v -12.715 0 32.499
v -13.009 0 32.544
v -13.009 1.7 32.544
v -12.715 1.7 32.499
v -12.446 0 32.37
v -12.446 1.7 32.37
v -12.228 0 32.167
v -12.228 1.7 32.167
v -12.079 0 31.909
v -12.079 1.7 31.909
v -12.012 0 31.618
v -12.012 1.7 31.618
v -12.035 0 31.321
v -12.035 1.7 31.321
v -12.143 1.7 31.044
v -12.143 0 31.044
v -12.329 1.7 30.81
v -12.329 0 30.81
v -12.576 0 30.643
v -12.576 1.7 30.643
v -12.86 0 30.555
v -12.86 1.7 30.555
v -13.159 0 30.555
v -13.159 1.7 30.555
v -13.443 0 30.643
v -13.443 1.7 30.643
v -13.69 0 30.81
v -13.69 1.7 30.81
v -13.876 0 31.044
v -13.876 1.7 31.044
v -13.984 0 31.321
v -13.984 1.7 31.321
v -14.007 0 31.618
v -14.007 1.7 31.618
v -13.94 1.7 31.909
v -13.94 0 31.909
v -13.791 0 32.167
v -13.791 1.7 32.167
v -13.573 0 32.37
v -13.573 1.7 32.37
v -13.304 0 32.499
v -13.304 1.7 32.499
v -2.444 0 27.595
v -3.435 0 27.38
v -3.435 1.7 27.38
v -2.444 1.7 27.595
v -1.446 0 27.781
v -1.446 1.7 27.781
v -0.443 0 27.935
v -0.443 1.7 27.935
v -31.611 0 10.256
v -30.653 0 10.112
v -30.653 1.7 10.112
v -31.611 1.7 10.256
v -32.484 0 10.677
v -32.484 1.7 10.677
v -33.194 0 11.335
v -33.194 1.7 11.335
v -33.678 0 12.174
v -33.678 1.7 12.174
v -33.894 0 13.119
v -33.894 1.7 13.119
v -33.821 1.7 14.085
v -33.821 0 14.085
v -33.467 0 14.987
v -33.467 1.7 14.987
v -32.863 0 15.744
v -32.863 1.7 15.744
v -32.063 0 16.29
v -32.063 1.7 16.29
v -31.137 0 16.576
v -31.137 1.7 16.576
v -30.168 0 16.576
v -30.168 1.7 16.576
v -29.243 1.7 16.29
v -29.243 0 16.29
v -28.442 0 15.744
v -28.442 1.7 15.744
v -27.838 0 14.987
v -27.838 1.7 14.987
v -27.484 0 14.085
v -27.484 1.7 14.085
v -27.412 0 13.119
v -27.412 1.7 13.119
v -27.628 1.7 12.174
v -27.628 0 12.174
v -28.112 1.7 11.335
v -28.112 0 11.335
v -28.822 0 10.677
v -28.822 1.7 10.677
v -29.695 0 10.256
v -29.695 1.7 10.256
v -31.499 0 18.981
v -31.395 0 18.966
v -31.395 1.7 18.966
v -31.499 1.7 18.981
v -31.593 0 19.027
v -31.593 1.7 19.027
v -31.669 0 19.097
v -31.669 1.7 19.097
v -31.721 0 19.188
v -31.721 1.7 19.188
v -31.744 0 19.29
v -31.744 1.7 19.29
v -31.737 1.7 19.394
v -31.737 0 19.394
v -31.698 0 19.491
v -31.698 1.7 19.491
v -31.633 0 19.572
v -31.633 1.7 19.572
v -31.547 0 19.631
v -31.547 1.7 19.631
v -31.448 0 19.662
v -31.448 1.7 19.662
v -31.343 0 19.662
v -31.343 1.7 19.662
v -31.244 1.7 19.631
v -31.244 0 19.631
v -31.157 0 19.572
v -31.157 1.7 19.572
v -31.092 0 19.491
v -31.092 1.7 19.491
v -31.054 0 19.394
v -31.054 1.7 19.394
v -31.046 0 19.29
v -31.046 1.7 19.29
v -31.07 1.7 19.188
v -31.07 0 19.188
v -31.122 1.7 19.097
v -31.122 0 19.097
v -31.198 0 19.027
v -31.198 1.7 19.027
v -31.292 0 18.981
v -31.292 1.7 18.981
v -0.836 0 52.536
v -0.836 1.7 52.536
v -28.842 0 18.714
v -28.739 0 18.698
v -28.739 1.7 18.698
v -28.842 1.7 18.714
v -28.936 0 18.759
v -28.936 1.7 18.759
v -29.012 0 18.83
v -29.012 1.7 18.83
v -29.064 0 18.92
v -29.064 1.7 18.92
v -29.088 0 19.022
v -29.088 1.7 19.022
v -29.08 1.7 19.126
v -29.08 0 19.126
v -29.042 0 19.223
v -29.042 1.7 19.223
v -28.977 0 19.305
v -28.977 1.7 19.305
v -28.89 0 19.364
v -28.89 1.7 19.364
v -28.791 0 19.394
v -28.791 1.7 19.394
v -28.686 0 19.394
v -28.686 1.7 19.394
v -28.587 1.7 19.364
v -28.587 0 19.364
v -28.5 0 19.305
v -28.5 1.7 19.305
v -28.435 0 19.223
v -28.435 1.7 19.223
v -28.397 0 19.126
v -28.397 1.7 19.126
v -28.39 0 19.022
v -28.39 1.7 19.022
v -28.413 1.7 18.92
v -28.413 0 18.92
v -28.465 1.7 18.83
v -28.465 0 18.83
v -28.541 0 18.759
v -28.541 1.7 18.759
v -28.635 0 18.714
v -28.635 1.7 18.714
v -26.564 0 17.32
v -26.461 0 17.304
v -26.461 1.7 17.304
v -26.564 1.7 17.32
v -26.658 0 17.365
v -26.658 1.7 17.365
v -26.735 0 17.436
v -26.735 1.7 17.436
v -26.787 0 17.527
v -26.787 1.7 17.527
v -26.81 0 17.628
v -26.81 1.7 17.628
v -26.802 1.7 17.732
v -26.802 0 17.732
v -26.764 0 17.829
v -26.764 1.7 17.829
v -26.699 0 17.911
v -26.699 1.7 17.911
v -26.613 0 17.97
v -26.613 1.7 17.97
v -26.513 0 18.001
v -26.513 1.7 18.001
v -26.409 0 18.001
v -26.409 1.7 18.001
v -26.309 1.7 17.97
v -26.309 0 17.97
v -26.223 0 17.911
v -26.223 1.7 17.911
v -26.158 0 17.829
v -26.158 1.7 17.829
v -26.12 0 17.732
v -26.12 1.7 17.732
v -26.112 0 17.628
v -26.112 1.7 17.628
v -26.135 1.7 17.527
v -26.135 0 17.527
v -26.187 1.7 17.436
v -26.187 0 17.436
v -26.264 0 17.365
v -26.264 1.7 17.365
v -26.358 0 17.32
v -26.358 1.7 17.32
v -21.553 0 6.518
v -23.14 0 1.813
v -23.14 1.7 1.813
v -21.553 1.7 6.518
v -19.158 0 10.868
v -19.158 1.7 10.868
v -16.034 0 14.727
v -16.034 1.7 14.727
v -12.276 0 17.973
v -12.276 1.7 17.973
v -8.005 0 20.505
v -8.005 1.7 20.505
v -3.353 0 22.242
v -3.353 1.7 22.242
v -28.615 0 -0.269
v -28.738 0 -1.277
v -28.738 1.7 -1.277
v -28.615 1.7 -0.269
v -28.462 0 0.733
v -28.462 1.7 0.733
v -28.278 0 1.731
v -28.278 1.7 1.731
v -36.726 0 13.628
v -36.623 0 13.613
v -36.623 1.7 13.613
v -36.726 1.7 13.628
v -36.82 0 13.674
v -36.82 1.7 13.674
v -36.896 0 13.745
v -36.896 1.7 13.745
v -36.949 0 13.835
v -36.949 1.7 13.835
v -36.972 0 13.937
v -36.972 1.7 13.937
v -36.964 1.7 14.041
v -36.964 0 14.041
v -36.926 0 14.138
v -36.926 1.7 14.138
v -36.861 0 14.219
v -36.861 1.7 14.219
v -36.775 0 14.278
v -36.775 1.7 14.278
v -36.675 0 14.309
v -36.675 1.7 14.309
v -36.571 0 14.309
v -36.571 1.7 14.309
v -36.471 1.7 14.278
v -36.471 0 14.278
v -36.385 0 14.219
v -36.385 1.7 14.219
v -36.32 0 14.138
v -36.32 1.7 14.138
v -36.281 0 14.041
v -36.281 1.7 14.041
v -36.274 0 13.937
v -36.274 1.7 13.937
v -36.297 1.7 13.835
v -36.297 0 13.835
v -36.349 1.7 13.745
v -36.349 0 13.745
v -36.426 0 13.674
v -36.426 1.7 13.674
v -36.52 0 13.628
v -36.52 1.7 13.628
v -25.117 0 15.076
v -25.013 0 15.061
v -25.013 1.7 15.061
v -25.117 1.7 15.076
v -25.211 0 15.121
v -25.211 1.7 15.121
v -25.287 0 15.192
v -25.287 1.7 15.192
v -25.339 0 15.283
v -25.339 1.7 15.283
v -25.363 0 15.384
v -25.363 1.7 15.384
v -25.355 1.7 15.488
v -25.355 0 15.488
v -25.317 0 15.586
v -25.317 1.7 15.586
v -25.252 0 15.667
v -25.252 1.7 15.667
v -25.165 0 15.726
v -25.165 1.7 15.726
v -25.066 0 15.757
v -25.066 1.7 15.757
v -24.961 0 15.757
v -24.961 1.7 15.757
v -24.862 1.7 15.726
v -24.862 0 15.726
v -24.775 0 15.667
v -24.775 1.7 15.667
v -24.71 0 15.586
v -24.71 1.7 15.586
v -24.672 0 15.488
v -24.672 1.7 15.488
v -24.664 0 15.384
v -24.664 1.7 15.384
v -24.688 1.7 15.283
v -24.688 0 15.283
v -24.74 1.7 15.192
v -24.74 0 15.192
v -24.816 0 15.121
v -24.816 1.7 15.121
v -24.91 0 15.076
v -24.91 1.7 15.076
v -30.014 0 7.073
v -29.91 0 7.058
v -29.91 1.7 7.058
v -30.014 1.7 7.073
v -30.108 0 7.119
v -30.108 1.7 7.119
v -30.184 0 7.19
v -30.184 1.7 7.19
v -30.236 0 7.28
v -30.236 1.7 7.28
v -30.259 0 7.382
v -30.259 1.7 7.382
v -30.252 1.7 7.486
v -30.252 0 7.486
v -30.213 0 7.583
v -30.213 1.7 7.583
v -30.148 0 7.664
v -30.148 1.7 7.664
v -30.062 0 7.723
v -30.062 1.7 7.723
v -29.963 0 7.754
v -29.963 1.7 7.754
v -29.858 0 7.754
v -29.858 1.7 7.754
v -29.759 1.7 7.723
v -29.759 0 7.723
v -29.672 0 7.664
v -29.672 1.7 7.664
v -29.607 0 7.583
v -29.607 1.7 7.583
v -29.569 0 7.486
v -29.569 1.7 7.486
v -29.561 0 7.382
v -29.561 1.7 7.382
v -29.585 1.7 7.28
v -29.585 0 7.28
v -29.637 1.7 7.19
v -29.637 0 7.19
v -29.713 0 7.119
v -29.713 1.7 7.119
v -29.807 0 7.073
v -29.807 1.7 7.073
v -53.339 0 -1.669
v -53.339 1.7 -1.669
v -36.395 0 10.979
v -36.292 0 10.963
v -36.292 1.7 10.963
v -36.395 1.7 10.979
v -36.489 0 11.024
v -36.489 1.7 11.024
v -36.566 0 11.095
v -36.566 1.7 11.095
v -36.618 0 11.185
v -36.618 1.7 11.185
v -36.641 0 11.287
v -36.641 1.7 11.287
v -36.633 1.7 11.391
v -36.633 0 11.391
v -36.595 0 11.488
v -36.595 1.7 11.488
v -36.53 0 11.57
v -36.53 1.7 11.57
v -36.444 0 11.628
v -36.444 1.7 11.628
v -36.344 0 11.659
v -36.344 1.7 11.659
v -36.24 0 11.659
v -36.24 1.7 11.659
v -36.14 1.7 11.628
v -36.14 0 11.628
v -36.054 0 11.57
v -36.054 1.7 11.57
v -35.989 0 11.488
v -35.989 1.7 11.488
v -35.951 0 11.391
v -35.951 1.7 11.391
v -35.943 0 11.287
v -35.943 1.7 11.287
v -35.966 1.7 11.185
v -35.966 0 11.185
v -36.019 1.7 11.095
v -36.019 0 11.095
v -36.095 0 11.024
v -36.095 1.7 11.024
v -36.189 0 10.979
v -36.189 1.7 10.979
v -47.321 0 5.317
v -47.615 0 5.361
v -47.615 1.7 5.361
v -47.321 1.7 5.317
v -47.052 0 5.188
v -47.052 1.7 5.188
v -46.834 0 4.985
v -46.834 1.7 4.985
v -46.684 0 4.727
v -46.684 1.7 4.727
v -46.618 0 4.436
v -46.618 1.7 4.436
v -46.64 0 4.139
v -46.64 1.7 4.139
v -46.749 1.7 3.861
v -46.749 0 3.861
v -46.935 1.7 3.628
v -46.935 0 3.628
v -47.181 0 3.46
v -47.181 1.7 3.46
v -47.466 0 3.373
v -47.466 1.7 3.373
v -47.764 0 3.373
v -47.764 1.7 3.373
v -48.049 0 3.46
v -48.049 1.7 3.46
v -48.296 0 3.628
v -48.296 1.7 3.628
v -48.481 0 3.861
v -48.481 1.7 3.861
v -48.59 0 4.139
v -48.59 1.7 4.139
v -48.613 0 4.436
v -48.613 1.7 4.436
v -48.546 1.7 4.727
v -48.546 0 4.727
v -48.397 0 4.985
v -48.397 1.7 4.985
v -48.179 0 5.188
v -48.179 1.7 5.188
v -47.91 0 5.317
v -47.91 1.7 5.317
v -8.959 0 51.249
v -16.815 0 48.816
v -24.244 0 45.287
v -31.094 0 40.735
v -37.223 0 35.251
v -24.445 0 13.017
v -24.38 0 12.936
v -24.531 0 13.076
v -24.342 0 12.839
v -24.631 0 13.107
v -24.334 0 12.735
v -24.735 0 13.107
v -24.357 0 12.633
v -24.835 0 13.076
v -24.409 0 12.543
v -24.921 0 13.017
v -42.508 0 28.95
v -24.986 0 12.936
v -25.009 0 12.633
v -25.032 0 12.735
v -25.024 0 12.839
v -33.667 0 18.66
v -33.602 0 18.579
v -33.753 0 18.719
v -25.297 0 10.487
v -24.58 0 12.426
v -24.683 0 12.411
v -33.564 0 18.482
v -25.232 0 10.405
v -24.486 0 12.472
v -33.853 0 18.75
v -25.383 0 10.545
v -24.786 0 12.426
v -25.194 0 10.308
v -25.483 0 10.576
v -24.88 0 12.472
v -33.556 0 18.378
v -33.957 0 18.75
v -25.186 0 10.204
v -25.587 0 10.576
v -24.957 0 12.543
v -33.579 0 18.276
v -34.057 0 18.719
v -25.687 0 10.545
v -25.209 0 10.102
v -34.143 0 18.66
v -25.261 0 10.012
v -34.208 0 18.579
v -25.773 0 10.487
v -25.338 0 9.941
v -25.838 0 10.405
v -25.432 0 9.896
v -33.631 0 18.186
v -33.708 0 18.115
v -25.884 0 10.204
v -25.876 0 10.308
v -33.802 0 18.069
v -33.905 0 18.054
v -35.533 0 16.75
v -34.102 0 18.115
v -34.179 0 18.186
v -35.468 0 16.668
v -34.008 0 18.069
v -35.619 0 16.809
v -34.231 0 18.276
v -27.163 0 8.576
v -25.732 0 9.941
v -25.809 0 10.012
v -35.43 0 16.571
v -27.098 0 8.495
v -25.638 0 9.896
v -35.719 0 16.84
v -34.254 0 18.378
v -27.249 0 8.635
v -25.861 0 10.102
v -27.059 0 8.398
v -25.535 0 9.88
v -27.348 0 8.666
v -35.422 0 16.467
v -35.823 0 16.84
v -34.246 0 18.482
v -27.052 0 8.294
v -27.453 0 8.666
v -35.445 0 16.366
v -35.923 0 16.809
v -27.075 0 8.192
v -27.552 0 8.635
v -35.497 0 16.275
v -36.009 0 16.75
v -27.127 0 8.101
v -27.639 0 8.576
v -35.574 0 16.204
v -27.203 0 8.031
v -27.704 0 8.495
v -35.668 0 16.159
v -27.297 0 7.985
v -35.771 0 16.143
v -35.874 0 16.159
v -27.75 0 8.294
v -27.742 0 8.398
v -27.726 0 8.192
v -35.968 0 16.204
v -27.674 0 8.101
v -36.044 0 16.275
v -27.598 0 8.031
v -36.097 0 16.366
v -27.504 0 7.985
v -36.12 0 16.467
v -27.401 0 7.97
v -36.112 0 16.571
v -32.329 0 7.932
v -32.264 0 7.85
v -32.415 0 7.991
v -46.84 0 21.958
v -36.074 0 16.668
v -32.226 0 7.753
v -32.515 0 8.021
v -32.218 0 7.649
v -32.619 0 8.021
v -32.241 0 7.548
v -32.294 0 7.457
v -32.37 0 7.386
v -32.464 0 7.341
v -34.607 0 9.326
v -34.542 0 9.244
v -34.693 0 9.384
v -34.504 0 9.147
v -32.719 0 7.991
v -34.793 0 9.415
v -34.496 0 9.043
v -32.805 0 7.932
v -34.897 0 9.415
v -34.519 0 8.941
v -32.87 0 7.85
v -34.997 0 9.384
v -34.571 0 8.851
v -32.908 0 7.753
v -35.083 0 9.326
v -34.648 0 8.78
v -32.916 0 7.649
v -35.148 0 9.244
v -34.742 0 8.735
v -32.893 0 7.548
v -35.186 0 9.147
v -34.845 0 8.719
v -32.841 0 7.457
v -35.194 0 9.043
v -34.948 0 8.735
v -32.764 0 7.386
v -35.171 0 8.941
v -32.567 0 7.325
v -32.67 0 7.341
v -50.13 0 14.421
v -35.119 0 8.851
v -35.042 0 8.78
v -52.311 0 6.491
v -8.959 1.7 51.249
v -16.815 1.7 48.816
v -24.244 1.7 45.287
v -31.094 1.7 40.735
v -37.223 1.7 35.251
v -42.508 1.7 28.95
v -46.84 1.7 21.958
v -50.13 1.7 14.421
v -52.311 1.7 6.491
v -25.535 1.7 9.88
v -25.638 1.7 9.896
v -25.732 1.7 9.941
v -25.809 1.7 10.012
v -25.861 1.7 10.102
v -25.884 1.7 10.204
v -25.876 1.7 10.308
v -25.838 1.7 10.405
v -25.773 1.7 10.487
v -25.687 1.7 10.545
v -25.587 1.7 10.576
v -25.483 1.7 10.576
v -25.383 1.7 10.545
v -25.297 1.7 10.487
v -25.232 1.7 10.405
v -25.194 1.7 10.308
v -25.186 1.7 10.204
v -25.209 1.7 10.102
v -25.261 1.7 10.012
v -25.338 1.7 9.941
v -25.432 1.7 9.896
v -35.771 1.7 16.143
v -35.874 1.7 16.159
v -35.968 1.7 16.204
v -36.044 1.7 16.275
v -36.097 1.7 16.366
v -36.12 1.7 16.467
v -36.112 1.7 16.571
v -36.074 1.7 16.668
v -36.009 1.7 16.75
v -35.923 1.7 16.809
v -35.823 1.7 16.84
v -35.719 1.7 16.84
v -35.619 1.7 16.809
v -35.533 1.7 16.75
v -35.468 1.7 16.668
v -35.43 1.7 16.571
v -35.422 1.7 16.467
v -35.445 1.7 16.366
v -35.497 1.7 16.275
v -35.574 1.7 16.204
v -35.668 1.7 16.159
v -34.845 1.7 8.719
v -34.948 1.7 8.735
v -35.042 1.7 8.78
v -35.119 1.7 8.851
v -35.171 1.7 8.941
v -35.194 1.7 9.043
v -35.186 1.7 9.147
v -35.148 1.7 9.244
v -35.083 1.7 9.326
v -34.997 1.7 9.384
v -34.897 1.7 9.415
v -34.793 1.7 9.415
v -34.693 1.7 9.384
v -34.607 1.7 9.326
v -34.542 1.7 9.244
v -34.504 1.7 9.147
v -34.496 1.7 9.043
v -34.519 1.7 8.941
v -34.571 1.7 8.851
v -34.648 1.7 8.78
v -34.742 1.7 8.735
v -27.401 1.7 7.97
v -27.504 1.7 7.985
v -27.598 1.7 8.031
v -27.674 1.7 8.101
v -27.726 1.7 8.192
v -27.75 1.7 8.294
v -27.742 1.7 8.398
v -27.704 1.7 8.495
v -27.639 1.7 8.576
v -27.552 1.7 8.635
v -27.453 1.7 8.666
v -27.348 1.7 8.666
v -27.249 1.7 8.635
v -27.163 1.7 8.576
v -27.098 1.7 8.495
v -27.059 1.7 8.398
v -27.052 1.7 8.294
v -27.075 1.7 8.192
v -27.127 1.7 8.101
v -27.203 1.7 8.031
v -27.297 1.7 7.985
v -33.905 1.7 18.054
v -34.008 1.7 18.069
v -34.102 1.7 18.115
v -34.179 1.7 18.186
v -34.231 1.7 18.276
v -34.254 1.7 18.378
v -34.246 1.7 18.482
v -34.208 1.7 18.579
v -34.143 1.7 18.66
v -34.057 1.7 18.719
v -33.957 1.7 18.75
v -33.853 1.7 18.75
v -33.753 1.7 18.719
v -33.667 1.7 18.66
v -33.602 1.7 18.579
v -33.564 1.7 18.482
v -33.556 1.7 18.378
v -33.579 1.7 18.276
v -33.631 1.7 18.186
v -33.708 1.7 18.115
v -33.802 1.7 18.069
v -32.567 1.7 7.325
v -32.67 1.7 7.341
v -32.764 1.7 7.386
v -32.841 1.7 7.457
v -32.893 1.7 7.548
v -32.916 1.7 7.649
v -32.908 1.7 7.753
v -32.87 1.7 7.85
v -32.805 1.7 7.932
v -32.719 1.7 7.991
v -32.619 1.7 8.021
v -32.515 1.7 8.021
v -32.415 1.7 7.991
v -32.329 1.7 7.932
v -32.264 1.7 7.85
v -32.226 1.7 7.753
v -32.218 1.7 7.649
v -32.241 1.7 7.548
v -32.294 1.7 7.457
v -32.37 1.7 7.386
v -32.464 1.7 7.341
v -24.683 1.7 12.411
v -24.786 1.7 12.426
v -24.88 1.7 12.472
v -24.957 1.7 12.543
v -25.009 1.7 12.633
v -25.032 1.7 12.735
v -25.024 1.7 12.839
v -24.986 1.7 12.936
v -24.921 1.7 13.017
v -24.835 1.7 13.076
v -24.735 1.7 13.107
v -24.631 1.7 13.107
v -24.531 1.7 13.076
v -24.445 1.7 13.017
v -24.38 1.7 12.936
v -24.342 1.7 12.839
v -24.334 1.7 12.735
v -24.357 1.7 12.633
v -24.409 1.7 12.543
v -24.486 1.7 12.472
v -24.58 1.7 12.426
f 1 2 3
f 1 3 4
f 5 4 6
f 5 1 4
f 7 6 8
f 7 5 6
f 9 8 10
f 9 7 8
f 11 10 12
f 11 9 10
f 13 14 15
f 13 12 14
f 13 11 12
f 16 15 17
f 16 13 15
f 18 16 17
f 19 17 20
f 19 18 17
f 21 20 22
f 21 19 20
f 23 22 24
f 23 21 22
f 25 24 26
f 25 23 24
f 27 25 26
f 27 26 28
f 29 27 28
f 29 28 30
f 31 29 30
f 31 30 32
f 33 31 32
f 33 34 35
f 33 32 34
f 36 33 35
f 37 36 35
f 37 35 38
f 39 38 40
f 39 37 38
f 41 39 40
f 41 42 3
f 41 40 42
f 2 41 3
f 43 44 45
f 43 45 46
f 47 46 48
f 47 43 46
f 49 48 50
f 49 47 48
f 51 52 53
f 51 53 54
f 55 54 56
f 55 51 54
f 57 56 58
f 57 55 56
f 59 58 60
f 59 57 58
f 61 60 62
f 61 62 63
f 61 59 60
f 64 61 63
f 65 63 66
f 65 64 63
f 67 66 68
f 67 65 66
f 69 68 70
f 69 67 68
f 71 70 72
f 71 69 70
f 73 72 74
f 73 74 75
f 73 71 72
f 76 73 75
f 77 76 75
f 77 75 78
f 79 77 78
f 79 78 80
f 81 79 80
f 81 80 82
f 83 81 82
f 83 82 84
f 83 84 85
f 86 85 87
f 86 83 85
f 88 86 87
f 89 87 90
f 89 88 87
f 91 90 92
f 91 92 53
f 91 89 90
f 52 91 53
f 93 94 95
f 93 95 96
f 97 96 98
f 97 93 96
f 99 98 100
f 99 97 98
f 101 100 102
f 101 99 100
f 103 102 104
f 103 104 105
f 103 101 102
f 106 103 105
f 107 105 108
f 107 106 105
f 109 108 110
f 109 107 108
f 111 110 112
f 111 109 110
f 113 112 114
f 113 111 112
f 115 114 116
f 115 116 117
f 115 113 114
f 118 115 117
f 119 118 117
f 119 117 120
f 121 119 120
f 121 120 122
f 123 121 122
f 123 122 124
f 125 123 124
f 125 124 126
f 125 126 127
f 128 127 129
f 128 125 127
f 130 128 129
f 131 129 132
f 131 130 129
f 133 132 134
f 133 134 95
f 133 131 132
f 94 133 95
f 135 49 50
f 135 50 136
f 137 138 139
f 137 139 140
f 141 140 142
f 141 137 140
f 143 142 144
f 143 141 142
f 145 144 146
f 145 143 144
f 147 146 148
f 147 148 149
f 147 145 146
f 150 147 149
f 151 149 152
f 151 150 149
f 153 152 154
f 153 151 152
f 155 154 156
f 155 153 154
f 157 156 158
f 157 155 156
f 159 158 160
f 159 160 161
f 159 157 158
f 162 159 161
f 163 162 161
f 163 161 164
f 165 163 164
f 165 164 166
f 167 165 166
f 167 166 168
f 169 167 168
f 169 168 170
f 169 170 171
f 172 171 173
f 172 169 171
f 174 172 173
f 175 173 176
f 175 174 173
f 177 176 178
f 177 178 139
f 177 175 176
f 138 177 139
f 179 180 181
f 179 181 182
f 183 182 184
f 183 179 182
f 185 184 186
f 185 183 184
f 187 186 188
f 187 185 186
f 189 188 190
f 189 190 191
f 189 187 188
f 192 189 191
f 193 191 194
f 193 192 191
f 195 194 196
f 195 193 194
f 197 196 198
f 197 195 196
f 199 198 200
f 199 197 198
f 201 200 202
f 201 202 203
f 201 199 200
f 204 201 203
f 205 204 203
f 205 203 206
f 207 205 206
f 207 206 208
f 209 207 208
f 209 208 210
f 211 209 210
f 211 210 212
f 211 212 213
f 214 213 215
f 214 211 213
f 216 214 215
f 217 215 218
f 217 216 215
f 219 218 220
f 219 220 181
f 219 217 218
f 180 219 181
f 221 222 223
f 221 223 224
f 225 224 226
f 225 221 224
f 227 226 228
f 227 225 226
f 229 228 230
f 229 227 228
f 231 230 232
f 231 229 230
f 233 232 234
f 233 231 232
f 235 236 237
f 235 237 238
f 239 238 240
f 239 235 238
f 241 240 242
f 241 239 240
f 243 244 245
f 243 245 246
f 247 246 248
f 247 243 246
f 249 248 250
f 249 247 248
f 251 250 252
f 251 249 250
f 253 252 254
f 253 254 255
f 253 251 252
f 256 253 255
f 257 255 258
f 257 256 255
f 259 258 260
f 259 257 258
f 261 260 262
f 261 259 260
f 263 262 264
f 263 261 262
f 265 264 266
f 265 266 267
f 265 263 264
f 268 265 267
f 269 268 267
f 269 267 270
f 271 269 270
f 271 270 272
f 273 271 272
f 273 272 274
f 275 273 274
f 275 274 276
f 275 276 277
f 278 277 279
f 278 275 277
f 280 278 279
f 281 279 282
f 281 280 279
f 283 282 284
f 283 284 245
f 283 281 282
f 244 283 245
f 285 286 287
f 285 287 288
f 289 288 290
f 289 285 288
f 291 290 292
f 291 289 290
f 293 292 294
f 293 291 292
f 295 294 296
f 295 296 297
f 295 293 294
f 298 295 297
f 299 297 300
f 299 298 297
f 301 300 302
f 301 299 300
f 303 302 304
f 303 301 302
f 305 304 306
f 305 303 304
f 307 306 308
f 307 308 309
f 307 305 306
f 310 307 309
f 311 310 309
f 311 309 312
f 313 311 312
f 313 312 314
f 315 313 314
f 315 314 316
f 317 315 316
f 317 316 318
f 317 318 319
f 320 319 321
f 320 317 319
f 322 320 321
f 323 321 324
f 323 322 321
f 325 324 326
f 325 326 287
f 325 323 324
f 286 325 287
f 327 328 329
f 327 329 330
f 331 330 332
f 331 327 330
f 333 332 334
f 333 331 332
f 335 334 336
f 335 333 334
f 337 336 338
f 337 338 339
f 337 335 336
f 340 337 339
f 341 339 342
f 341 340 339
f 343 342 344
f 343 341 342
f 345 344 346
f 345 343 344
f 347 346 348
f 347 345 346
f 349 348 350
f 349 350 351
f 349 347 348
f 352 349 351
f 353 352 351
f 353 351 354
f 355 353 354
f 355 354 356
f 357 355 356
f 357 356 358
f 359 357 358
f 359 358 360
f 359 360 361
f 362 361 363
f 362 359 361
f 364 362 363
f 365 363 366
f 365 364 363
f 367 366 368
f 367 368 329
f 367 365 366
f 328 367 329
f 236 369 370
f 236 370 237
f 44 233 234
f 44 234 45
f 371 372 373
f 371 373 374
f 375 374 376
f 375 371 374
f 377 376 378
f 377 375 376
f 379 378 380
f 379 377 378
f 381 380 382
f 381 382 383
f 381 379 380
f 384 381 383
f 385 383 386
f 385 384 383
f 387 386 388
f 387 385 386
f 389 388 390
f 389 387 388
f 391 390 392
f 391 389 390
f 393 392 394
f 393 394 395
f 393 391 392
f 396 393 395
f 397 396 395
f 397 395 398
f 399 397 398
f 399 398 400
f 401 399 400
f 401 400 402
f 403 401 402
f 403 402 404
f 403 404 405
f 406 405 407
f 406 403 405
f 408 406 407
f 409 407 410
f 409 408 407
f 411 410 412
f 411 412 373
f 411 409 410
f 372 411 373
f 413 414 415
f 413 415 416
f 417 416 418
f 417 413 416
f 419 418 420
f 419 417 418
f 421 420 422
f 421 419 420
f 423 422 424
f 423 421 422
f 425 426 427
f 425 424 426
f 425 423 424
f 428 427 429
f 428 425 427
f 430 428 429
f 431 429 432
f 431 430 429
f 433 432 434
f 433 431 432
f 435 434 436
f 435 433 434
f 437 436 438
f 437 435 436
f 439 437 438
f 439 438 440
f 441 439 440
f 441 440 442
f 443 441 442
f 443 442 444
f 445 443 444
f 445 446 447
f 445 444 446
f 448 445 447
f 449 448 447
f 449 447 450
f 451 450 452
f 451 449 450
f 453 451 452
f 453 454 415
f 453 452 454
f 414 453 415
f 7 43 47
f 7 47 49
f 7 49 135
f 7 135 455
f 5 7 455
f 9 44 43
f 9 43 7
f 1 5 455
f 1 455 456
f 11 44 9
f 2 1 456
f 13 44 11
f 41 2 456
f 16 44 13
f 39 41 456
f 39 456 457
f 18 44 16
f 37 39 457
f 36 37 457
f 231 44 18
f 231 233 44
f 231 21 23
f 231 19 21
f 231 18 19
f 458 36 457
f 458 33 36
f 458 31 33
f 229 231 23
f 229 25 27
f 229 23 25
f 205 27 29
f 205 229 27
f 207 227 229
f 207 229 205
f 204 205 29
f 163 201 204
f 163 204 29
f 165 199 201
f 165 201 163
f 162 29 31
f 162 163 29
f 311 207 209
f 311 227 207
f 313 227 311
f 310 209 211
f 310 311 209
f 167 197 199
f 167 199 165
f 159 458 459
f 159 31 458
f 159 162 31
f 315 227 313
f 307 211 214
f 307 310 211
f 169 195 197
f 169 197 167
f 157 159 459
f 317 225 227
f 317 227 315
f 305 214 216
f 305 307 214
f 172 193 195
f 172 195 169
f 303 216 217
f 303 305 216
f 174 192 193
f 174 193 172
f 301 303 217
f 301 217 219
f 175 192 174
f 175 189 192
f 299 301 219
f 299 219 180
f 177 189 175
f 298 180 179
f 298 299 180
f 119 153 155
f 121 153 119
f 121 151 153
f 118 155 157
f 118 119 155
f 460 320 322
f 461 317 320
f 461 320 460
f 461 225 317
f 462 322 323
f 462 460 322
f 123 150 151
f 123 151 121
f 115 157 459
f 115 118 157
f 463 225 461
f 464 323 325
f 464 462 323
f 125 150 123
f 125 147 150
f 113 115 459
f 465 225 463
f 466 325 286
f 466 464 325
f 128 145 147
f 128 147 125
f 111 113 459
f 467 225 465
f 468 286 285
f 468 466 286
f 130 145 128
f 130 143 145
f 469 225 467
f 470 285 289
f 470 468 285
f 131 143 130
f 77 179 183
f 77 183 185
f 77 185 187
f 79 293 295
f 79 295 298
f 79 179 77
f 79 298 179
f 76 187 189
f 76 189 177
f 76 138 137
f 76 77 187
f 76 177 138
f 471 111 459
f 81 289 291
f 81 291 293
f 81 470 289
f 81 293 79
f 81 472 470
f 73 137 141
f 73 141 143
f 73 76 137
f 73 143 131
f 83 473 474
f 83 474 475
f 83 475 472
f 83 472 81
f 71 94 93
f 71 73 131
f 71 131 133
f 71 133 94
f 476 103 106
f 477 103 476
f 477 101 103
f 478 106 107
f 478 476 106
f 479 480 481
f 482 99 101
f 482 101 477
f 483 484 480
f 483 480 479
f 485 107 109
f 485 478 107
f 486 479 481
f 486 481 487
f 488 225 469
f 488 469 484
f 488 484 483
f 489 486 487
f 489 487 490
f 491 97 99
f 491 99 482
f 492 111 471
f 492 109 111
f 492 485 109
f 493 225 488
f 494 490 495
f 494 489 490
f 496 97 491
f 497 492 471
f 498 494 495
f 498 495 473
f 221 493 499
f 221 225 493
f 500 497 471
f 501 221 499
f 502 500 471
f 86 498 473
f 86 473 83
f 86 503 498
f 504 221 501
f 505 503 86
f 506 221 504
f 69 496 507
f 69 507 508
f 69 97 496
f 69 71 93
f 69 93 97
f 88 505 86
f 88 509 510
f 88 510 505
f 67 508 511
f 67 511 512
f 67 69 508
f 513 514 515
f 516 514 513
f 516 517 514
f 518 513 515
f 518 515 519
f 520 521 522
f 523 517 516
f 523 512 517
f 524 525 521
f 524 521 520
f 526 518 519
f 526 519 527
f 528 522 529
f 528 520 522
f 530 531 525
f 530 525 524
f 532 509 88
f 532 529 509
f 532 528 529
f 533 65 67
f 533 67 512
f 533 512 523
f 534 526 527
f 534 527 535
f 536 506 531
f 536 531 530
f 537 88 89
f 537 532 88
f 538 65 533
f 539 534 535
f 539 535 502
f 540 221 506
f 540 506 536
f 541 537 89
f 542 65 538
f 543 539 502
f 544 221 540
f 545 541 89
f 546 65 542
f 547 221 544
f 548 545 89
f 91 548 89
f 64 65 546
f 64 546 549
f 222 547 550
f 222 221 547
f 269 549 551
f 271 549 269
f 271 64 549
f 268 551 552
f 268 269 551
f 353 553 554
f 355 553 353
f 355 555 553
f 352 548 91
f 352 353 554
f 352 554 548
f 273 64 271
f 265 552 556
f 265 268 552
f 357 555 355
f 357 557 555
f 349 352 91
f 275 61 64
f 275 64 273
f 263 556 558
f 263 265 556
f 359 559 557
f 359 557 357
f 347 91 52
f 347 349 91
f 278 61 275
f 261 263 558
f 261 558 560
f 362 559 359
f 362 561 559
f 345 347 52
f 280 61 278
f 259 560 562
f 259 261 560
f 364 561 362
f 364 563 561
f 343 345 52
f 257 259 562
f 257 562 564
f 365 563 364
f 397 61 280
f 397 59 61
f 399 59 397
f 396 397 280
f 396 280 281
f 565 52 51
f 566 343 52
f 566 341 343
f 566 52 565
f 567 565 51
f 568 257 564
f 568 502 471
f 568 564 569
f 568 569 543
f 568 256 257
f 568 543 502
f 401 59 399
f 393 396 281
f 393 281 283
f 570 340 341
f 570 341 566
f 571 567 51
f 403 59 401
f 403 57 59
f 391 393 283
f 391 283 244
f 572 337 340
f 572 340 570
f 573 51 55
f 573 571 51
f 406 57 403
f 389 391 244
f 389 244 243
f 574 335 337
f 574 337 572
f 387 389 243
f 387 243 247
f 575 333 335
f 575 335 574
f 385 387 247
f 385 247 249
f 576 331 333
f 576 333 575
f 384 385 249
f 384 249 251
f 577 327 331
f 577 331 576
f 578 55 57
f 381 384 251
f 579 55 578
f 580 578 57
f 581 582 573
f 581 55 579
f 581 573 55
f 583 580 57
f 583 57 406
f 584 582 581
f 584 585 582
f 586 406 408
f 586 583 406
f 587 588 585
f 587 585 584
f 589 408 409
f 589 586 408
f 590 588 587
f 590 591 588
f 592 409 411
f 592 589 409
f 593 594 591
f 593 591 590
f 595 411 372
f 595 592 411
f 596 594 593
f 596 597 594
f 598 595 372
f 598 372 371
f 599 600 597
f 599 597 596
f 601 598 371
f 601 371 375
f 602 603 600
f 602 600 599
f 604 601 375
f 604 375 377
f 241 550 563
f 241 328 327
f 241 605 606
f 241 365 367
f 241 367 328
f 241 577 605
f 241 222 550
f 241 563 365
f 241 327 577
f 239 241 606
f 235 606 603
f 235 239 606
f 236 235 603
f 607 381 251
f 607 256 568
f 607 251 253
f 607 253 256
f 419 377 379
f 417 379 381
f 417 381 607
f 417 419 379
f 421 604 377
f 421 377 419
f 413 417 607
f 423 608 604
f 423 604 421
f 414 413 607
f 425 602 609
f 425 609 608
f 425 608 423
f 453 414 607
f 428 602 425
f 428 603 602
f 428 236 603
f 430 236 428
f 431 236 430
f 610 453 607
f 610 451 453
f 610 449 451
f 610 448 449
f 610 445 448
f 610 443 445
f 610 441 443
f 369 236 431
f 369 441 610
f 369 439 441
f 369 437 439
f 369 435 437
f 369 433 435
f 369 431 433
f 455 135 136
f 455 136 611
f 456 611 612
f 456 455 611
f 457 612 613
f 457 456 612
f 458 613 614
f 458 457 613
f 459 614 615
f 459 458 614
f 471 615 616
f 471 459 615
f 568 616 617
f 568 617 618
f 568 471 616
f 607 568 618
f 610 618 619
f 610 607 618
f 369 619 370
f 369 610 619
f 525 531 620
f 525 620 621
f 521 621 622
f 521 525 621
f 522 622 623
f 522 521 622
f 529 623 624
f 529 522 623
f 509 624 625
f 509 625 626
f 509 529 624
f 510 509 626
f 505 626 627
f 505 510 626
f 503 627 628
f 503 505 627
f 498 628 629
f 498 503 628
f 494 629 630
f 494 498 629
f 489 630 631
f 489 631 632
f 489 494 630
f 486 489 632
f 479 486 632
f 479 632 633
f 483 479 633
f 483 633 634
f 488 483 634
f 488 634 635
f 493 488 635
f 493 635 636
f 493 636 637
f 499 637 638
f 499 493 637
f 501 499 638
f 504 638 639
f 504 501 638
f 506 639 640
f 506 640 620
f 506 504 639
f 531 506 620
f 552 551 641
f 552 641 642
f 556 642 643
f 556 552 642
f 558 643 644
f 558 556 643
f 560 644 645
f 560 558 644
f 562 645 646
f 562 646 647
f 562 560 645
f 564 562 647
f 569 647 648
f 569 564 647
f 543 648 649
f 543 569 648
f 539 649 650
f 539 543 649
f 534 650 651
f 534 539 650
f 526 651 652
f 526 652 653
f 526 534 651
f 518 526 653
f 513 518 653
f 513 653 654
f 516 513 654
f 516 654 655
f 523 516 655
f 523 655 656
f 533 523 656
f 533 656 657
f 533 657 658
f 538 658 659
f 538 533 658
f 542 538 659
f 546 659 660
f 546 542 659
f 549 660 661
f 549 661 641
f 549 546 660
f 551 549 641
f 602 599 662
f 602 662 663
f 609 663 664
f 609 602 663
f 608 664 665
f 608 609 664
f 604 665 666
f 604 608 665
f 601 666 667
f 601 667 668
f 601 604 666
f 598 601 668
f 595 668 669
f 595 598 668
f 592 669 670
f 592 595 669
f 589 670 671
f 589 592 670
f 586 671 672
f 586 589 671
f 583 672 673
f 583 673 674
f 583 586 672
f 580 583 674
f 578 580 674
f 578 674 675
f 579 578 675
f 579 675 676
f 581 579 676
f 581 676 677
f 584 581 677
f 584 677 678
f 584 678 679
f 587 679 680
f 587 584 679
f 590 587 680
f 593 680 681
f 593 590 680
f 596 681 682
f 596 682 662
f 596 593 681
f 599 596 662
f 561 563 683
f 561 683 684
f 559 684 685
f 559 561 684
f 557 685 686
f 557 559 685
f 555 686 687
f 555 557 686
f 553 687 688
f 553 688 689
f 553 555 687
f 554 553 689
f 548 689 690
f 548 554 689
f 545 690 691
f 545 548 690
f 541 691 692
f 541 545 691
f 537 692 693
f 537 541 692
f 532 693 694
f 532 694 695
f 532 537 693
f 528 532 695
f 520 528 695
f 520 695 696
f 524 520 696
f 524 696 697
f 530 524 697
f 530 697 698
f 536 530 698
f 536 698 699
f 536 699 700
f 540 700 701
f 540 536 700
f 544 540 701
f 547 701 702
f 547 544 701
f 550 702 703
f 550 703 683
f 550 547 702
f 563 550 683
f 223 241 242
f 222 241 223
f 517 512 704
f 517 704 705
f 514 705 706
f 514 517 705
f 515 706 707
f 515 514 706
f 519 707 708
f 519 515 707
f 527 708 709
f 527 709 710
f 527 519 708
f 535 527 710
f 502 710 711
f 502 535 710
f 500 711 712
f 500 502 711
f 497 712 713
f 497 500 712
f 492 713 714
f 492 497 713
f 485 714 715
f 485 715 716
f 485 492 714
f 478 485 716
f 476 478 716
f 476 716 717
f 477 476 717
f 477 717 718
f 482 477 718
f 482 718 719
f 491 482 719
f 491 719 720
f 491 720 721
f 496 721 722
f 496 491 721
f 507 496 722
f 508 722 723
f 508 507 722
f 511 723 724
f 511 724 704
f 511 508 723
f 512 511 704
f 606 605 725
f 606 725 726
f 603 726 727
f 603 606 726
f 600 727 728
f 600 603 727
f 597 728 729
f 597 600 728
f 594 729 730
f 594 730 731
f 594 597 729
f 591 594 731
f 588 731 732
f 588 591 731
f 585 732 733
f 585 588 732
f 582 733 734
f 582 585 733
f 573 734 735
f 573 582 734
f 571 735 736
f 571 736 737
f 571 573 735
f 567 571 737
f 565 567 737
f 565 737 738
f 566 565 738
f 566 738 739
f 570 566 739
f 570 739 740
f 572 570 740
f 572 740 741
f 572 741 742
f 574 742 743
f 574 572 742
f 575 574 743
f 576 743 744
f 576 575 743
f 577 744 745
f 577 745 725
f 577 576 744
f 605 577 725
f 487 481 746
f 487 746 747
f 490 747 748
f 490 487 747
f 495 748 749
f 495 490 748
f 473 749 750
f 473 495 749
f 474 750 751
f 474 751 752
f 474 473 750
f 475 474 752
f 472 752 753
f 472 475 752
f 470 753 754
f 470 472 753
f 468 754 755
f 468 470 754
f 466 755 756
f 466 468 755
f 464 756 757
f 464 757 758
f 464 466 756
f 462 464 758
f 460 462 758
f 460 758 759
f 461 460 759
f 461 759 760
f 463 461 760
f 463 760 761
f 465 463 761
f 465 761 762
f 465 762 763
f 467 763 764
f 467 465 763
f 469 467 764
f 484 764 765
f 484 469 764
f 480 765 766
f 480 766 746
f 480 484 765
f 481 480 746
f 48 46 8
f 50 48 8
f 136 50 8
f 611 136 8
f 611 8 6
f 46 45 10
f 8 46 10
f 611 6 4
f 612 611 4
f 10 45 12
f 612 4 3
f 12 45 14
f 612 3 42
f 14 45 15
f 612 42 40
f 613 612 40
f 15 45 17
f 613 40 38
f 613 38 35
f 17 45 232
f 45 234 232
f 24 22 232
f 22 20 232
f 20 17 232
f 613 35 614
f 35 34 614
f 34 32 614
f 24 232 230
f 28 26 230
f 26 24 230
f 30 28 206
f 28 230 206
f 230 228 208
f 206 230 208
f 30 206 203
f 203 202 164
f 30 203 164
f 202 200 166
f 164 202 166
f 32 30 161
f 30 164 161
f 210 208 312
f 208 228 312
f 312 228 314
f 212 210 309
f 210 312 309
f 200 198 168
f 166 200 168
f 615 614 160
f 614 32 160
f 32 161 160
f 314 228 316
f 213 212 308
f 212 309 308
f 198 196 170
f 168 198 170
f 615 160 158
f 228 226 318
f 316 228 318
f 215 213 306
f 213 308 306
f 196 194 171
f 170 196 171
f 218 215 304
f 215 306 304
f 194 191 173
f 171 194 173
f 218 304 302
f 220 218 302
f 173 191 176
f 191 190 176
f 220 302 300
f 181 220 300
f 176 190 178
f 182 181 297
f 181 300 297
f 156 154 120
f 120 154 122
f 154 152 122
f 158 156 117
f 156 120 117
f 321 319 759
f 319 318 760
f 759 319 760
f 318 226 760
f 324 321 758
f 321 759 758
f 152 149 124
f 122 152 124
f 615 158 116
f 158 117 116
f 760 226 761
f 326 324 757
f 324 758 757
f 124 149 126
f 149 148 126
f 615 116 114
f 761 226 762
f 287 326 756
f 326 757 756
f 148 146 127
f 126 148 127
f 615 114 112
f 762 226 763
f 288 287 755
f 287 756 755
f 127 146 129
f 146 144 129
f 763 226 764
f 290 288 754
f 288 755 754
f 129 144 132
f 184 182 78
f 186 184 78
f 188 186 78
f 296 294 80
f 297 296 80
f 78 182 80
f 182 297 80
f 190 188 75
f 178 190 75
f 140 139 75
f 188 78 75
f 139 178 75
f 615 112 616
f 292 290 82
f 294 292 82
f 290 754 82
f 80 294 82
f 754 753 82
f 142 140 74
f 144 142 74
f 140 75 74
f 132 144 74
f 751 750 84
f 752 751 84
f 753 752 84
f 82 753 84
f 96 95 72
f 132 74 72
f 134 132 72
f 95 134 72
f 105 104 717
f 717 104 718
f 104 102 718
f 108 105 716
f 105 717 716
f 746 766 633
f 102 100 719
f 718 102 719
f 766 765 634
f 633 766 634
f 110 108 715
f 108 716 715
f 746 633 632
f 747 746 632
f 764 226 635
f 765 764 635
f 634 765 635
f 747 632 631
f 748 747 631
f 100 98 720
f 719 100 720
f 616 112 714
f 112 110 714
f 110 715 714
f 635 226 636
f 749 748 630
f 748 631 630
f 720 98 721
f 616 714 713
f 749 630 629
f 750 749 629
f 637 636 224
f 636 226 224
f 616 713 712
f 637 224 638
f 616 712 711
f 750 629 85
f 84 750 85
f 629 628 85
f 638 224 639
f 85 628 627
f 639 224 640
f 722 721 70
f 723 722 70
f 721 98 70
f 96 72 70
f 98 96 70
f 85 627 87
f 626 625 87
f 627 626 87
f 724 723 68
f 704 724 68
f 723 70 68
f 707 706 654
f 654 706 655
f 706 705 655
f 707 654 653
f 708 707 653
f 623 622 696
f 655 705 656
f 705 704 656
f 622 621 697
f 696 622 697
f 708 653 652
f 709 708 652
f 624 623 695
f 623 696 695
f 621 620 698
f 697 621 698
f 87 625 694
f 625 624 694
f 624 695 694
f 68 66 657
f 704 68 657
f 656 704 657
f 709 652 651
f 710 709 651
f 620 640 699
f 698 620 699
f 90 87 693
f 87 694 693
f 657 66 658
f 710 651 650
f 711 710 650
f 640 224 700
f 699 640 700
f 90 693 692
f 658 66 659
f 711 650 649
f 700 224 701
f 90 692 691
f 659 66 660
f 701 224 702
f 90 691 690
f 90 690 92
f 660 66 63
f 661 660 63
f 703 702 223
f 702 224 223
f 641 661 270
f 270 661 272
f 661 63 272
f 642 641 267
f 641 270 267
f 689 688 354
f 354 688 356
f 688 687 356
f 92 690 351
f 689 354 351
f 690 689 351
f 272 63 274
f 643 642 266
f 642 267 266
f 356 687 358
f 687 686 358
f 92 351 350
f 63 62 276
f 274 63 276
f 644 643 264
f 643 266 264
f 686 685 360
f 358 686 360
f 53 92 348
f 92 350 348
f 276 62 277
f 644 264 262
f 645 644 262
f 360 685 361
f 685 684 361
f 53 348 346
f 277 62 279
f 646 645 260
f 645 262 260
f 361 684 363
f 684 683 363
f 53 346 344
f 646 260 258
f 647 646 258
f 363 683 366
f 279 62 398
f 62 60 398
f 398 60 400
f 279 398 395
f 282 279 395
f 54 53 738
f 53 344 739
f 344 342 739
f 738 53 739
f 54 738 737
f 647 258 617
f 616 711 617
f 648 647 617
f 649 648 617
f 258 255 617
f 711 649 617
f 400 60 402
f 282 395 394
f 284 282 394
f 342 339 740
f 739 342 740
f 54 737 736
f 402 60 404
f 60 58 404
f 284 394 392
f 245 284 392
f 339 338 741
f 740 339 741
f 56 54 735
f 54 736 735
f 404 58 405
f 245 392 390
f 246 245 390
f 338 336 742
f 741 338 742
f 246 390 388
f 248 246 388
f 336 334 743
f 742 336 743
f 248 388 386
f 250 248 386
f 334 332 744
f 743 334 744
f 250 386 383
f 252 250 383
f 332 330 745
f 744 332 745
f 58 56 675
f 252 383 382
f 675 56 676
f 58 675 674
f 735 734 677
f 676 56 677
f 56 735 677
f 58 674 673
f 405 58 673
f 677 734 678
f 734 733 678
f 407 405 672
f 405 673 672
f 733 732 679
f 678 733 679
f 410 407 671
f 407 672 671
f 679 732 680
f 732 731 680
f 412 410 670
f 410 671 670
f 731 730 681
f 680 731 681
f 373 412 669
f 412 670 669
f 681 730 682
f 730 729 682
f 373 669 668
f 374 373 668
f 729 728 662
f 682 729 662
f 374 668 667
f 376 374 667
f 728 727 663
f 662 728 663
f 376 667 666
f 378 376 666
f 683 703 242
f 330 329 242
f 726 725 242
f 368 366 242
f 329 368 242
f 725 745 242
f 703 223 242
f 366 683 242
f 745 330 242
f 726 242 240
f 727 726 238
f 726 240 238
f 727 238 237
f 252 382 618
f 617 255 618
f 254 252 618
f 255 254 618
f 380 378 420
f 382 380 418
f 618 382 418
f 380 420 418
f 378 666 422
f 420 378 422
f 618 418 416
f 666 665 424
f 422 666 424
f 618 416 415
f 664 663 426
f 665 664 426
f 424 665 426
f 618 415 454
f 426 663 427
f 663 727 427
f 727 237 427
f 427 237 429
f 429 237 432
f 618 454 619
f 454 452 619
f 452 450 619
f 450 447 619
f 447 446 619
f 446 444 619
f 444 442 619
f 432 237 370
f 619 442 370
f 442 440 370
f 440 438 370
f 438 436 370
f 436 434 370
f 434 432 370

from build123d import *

# Parameters (mm, degrees)
SKETCH1_R               = 0.35
SKETCH1_R_2             = 3.25
BOSS_EXTRUDE1_DEPTH     = 1.7
CUT_EXTRUDE9_DEPTH      = 92.720556649
CUT_EXTRUDE9_DEPTH_BACK = 8
SKETCH10_R              = 1


with BuildPart() as part:
    # Sketch1 → Boss-Extrude1 (new body)
    with BuildSketch(Plane(origin=(0, 0, 0), x_dir=(0.9998727759206639, 0, 0.01595092388251767), z_dir=(0, 1, 0))):
        with BuildLine():
            Line((-2.997717637, -22.894746364), (-2.997717637, -27.430964436))
            ThreePointArc((-2.997717637, -27.430964436), (-1.503571481, -27.719382228), (0.002282363, -27.938612151))
            Line((0.002282363, -27.938612151), (0.002282363, -52.542634275))
            ThreePointArc((0.002282363, -52.542634275), (-36.656357556, -35.840573361), (-53.35841847, 0.818066557))
            Line((-53.35841847, 0.818066557), (-28.754396346, 0.818066557))
            ThreePointArc((-28.754396346, 0.818066557), (-28.535166423, -0.687787287), (-28.246748631, -2.181933443))
            Line((-28.246748631, -2.181933443), (-23.710530558, -2.181933443))
            Line((-23.710530558, -2.181933443), (-23.108601061, -2.181933443))
            ThreePointArc((-23.108601061, -2.181933443), (-15.796707511, -14.980923316), (-2.997717637, -22.292816866))
            Line((-2.997717637, -22.292816866), (-2.997717637, -22.894746364))
        make_face()
        with Locations(Location((-27.264431182, -8.755704918, 0), (0, 0, 90.913959377))):
            Circle(SKETCH1_R, mode=Mode.SUBTRACT)
        with Locations(Location((-25.368580215, -10.636127908, 0), (0, 0, 90.913959377))):
            Circle(SKETCH1_R, mode=Mode.SUBTRACT)
        with Locations(Location((-24.476362472, -13.152909386, 0), (0, 0, 90.913959377))):
            Circle(SKETCH1_R, mode=Mode.SUBTRACT)
        with Locations(Location((-24.764492621, -15.807569916, 0), (0, 0, 90.913959377))):
            Circle(SKETCH1_R, mode=Mode.SUBTRACT)
        with Locations(Location((-26.175902952, -18.074321422, 0), (0, 0, 90.913959377))):
            Circle(SKETCH1_R, mode=Mode.SUBTRACT)
        with Locations(Location((-28.431046339, -19.504205968, 0), (0, 0, 90.913959377))):
            Circle(SKETCH1_R, mode=Mode.SUBTRACT)
        with Locations(Location((-31.083263977, -19.814017383, 0), (0, 0, 90.913959377))):
            Circle(SKETCH1_R, mode=Mode.SUBTRACT)
        with Locations(Location((-33.607251635, -18.942393718, 0), (0, 0, 90.913959377))):
            Circle(SKETCH1_R, mode=Mode.SUBTRACT)
        with Locations(Location((-35.503102603, -17.061970729, 0), (0, 0, 90.913959377))):
            Circle(SKETCH1_R, mode=Mode.SUBTRACT)
        with Locations(Location((-36.395320345, -14.54518925, 0), (0, 0, 90.913959377))):
            Circle(SKETCH1_R, mode=Mode.SUBTRACT)
        with Locations(Location((-36.107190196, -11.890528721, 0), (0, 0, 90.913959377))):
            Circle(SKETCH1_R, mode=Mode.SUBTRACT)
        with Locations(Location((-34.695779865, -9.623777215, 0), (0, 0, 90.913959377))):
            Circle(SKETCH1_R, mode=Mode.SUBTRACT)
        with Locations(Location((-32.440636478, -8.193892669, 0), (0, 0, 90.913959377))):
            Circle(SKETCH1_R, mode=Mode.SUBTRACT)
        with Locations(Location((-29.78841884, -7.884081253, 0), (0, 0, 90.913959377))):
            Circle(SKETCH1_R, mode=Mode.SUBTRACT)
        with Locations(Location((-30.435841409, -13.849049318, 0), (0, 0, 90.913959377))):
            Circle(SKETCH1_R_2, mode=Mode.SUBTRACT)
    extrude(amount=BOSS_EXTRUDE1_DEPTH)

    # Sketch10 → Cut-Extrude9 (cut, two sides: drawn at the far end of the back side and taken through both)
    with BuildSketch(Plane(origin=(0, -51.287040458, 0), x_dir=(0.9998727759206634, 0, 0.015950923882551597), z_dir=(0, 1, 0)).offset(-CUT_EXTRUDE9_DEPTH_BACK)):
        with Locations(Location((-12.504691316, -31.747044129, 0), (0, 0, 270.913959377))):
            Circle(SKETCH10_R)
        with Locations(Location((-47.53974173, -5.120311842, 0), (0, 0, 270.913959377))):
            Circle(SKETCH10_R)
    extrude(amount=CUT_EXTRUDE9_DEPTH + CUT_EXTRUDE9_DEPTH_BACK, mode=Mode.SUBTRACT)


solid = part.part
